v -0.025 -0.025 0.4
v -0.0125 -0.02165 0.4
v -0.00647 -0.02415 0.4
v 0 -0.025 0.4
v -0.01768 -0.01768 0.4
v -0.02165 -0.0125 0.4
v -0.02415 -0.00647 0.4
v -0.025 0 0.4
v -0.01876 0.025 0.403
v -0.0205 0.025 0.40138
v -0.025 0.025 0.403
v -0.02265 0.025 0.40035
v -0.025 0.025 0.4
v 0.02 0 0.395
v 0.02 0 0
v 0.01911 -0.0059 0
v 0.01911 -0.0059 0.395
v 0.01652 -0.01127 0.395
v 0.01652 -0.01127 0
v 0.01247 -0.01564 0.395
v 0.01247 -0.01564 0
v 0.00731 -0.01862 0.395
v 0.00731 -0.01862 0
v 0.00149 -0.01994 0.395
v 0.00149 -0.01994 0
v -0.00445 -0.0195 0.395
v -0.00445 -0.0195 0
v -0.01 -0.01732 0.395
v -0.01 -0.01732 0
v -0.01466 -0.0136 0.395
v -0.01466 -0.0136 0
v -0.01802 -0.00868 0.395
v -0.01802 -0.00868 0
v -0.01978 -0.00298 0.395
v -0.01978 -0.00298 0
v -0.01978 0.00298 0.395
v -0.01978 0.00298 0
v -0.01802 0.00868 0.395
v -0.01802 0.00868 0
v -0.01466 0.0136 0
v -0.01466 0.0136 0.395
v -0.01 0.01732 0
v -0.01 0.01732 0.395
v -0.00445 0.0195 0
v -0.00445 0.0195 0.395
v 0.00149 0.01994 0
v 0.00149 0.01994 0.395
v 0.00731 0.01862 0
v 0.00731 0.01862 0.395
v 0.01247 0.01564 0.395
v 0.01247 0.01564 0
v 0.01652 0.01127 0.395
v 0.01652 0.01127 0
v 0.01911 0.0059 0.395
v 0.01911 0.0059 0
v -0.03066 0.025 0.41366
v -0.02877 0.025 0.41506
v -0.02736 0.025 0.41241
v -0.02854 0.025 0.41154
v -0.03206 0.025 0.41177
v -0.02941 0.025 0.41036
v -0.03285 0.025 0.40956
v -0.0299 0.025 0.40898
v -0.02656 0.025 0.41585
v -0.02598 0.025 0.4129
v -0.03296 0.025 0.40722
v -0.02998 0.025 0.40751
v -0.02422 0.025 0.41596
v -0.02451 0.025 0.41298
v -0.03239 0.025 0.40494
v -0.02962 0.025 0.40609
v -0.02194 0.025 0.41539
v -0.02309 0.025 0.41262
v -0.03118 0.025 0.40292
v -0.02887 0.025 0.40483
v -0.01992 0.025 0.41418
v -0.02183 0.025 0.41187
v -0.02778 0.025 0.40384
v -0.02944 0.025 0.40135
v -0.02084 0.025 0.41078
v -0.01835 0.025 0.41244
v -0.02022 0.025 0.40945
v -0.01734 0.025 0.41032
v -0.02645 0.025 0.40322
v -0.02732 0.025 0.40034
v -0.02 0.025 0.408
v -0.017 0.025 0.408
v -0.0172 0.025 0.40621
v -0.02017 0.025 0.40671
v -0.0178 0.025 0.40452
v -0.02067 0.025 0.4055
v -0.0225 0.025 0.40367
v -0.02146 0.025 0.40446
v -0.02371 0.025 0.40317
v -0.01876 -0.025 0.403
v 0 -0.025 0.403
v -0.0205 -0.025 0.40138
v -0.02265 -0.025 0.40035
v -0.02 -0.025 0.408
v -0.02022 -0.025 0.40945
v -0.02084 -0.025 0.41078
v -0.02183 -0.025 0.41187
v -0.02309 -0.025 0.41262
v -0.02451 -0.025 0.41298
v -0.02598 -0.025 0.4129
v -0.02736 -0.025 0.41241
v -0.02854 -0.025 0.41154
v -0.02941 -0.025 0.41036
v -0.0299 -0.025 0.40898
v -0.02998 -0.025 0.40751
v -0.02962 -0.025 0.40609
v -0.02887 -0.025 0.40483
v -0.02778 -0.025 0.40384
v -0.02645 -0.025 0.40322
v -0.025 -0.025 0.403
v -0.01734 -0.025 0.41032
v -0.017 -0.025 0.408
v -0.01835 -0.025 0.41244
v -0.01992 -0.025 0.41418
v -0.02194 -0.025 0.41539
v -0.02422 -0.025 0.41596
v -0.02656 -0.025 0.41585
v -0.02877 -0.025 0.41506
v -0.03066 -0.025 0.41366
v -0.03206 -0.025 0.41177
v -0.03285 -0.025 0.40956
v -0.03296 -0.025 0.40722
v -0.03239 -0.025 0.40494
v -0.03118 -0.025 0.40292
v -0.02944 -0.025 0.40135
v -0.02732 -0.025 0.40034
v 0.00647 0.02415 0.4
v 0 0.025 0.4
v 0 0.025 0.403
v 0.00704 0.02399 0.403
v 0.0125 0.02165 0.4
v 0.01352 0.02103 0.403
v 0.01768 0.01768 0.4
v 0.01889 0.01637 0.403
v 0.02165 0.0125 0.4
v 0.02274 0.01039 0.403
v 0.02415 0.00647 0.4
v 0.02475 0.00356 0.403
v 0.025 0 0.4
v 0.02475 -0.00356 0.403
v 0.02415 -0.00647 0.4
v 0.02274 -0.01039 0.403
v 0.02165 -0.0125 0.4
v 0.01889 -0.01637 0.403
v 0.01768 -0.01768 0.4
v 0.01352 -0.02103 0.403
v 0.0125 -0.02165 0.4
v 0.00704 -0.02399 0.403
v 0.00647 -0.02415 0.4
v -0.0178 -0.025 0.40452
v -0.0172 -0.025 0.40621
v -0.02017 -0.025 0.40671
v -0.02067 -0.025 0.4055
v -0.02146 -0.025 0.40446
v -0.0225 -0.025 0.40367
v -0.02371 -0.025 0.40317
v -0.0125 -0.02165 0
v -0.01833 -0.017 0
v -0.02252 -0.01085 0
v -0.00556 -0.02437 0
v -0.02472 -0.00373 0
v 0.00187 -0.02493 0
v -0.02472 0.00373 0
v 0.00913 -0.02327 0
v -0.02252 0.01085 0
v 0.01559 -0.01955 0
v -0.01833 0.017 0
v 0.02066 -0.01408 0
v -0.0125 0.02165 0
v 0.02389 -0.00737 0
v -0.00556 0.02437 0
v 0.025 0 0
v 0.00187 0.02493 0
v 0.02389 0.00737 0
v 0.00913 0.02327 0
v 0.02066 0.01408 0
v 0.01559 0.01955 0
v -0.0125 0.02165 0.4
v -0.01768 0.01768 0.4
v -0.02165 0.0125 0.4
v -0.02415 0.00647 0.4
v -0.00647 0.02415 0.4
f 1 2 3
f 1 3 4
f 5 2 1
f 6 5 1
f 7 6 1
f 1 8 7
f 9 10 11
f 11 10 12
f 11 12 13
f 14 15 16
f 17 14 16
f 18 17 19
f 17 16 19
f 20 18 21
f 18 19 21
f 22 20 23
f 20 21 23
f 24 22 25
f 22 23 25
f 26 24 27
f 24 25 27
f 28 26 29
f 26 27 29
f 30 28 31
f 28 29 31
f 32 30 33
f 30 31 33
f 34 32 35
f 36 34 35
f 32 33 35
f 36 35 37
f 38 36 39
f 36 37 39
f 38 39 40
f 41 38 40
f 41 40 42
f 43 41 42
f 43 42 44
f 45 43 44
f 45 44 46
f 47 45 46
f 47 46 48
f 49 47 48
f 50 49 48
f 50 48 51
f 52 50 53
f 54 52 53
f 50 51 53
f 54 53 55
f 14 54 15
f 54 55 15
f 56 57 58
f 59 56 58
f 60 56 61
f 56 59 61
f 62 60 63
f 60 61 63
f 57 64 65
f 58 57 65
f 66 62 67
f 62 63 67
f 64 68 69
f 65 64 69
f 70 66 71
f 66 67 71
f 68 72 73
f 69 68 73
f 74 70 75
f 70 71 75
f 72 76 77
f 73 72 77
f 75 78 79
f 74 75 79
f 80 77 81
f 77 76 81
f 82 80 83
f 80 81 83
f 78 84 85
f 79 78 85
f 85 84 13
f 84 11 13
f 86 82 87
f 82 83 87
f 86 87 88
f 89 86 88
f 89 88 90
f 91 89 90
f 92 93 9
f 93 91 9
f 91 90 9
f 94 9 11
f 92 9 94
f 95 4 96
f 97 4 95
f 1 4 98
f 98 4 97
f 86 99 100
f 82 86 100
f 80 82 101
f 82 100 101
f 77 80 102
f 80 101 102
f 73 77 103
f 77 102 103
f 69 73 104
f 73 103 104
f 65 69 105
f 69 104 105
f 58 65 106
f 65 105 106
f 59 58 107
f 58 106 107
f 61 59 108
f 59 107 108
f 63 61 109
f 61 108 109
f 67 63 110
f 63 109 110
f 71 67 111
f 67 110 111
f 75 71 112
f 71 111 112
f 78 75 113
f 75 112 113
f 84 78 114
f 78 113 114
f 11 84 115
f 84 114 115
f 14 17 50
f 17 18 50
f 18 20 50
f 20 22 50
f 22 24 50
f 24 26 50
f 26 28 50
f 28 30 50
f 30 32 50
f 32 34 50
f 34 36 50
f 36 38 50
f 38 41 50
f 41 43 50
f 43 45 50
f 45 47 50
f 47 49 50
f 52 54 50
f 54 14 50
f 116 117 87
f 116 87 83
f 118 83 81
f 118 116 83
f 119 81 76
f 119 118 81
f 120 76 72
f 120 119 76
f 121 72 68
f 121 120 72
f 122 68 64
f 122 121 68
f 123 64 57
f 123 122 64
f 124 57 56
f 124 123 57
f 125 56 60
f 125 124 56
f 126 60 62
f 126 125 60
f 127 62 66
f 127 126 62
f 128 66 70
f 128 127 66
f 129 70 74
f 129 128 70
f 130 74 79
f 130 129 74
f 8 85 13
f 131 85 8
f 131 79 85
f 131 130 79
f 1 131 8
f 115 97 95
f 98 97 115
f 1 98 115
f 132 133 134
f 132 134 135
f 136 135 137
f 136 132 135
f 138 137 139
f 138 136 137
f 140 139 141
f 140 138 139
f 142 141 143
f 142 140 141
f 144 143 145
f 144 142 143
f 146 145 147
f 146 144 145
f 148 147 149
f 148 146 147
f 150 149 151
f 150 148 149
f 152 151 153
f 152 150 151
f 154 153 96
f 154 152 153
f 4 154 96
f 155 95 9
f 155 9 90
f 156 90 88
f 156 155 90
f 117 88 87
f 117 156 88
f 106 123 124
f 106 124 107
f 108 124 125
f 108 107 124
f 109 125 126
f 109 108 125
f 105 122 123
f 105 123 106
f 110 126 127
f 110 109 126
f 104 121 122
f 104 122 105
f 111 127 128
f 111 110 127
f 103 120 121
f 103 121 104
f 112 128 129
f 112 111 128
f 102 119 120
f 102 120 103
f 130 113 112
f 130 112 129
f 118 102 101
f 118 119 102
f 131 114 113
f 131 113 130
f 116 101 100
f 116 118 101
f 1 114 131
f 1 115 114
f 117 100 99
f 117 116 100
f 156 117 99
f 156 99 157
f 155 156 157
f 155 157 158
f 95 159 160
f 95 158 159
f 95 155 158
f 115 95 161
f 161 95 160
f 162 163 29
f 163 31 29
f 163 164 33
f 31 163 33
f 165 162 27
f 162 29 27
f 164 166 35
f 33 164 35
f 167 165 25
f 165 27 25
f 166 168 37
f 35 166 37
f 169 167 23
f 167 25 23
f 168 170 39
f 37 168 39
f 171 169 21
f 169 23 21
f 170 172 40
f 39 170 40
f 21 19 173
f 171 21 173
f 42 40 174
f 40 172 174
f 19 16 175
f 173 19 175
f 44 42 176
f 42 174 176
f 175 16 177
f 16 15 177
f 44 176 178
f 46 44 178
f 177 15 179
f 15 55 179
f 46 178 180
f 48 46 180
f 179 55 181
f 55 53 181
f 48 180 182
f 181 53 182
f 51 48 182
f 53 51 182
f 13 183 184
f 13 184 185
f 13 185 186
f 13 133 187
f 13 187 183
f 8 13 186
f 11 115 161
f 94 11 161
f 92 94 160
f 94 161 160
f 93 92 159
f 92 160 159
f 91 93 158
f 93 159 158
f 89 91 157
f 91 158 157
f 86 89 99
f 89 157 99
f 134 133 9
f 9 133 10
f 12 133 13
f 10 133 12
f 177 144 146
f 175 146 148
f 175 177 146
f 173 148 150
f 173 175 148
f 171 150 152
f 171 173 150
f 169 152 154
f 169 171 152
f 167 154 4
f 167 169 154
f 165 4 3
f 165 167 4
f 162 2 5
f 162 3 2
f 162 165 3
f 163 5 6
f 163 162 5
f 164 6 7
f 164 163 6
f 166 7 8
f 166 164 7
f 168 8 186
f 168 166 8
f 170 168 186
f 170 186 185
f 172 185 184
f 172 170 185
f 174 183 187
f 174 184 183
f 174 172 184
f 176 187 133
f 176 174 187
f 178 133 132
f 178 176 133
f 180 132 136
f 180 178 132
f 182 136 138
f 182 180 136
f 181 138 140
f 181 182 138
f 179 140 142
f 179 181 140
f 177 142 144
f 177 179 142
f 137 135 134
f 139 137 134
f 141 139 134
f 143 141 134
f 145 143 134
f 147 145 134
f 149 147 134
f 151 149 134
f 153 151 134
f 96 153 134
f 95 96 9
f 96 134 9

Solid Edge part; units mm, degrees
sketch "Sketch1" plane through (0, 0, 0) normal (0, 0, 1) x (1, 0, 0)
  circle A0 centre (0, 0) radius 0.025
  dimension "D1" = 0.05
extrude "Protrusion1" add sketch "Sketch1" along normal blind 0.4
shell "Dünnwand_1" thickness 0.005 removed faces 1 at (-0.0172, -0.0162, 0)
sketch "Sketch2" plane through (0, 0, 0.4) normal (0, 0, 1) x (0, 1, 0)
  line L0 (-0.025, 0) -> (-0.025, 0.025)
  line L1 (0.025, 0.025) -> (-0.025, 0.025)
  line L2 (0.025, 0) -> (0.025, 0.025)
  arc A0 (0.025, 0) -> (-0.025, 0) centre (0, 0) cw
  dimension "D1" = 0.025
extrude "Ausprägung_2" add sketch "Sketch2" along normal blind 0.003
sketch "Sketch3" plane through (-0.0125, -0.025, 0.3015) normal (0, -1, 0) x (1, 0, 0)
  circle A0 centre (-0.0125, 0.1065) radius 0.005
  circle A1 centre (-0.0125, 0.1065) radius 0.008
  dimension "D1" = 0.01
extrude "Protrusion2" add sketch "Sketch3" against normal up to surface (0.05 mm away)
